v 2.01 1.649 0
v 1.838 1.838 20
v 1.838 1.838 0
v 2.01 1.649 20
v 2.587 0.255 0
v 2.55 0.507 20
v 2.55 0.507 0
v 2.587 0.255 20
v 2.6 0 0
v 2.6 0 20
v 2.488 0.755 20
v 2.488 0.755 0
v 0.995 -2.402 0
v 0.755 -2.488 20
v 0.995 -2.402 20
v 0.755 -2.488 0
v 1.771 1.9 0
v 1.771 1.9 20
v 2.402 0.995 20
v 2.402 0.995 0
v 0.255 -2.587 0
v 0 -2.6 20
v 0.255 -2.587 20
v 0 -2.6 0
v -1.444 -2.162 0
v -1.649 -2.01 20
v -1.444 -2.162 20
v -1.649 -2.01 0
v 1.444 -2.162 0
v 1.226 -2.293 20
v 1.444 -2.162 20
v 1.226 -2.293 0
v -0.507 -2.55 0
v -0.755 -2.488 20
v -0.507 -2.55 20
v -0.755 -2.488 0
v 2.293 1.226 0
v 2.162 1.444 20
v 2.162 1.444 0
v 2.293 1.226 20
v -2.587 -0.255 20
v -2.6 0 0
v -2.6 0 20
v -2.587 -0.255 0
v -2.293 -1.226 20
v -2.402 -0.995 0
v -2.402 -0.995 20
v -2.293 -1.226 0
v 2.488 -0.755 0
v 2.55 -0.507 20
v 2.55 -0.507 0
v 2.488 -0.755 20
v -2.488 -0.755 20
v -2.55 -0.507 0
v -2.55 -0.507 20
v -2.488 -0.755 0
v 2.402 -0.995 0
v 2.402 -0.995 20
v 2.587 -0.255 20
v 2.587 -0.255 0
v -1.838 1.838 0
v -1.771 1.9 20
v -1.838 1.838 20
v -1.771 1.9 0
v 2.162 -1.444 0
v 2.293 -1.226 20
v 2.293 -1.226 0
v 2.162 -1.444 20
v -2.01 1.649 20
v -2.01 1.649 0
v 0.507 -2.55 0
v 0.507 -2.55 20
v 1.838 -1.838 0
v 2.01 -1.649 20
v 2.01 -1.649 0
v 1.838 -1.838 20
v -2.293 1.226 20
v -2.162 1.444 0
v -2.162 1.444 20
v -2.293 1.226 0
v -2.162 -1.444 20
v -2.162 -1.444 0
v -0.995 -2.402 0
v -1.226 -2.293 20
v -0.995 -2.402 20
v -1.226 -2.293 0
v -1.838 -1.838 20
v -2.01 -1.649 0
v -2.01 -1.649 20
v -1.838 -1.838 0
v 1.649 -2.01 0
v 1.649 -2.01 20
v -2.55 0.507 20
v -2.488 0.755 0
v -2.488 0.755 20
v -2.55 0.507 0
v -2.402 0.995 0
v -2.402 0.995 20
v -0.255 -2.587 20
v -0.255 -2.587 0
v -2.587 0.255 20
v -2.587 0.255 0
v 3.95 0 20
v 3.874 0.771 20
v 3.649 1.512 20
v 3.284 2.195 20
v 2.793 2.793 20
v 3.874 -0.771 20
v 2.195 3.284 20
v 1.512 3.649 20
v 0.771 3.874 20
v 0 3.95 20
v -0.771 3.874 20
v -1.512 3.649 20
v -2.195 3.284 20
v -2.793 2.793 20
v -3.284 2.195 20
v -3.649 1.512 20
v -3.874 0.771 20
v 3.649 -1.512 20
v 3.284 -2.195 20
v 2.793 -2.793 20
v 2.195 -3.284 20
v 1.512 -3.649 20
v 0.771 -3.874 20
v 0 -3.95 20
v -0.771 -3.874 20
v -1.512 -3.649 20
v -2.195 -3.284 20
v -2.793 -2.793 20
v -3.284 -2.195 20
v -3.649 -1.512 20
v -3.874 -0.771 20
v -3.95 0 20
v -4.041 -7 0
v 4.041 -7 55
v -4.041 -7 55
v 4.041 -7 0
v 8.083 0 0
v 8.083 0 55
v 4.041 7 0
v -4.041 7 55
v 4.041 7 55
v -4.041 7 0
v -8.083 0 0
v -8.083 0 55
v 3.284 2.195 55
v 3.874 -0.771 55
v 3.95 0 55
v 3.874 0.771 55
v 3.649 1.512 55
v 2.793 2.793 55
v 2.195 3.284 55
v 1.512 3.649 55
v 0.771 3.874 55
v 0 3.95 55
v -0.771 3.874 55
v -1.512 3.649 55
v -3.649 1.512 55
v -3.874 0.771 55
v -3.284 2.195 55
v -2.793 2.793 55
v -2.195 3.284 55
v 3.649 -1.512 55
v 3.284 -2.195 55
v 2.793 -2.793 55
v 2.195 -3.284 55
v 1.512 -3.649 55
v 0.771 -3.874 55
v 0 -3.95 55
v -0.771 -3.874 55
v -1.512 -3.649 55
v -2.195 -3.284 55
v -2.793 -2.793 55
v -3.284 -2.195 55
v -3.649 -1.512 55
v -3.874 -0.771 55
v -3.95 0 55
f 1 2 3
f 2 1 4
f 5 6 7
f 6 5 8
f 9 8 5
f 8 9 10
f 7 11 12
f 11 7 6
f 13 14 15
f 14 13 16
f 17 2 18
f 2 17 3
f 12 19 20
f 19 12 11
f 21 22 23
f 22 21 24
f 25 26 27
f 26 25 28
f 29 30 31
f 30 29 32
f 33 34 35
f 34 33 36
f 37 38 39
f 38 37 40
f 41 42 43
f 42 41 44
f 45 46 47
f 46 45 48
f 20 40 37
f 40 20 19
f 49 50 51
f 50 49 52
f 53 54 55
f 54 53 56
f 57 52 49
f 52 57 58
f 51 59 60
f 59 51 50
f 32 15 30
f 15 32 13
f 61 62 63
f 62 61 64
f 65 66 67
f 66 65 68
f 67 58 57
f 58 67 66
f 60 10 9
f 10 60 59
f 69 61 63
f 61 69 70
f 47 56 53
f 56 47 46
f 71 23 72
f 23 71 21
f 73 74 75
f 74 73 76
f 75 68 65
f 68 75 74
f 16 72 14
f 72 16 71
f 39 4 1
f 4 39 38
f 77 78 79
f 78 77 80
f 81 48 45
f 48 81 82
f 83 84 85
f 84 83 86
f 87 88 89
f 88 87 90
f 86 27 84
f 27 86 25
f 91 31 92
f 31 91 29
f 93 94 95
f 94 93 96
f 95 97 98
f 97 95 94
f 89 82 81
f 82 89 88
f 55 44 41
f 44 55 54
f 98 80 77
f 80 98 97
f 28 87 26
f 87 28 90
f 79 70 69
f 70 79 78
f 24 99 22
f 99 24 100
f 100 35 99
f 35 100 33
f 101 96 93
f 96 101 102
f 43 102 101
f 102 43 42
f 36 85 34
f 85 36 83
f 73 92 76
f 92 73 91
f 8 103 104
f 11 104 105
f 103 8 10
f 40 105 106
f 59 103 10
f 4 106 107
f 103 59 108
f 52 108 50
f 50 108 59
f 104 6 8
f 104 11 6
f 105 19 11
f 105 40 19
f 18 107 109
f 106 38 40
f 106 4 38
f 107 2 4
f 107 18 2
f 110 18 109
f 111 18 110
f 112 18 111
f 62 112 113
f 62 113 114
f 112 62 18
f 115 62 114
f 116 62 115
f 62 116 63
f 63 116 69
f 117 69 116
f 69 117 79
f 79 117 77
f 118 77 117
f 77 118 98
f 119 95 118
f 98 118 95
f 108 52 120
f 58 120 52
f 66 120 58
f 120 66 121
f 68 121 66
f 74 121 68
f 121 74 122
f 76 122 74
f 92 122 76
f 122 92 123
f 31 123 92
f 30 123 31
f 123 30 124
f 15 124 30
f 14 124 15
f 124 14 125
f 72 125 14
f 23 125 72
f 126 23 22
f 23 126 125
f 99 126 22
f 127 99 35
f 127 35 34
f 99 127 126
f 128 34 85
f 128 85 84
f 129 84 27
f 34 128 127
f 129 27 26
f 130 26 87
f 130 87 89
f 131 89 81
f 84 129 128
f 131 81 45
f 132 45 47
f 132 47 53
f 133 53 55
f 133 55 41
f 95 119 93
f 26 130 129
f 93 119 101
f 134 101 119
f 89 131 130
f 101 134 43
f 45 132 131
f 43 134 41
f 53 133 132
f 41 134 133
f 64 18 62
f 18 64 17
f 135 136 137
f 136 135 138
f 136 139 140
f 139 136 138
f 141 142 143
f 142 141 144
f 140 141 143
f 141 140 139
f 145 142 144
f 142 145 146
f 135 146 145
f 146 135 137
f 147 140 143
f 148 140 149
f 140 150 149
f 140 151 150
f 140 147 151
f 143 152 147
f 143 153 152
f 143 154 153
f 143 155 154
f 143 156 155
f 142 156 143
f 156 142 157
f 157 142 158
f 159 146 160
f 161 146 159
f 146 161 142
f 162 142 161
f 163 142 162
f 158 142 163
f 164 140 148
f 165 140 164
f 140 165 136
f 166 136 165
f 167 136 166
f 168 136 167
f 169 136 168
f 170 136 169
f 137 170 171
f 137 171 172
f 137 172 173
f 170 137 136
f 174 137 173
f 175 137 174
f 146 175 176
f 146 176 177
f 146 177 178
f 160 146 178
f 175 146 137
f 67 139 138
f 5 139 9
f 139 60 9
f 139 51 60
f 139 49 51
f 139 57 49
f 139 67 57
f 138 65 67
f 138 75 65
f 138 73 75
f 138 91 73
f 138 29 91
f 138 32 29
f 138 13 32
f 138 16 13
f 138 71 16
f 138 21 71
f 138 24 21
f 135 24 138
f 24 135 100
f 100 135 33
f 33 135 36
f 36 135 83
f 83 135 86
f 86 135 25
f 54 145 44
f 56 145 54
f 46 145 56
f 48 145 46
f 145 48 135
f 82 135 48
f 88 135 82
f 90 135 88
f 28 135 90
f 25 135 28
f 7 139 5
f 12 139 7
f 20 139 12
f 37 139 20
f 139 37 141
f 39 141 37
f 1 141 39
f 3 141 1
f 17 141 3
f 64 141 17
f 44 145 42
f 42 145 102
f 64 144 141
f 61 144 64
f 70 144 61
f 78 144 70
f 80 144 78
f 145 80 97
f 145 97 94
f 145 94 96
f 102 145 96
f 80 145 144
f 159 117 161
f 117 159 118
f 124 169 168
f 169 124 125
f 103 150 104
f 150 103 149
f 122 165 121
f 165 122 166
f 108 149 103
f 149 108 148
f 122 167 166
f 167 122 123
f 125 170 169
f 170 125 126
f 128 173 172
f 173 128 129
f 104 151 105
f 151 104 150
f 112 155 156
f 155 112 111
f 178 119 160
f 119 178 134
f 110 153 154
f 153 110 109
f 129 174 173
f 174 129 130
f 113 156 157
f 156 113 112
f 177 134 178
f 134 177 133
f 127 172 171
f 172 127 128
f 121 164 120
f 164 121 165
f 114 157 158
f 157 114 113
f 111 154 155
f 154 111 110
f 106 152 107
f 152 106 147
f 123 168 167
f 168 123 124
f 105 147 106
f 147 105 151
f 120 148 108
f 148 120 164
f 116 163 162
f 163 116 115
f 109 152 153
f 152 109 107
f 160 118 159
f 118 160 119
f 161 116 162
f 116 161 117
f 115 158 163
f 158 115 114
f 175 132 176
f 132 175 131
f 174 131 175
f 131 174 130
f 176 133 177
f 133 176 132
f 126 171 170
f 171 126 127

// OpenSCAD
// PROJECT: 5kg Vertical Panel Actuator
// PART: Solid D-Profile Hex Coupler (Scratch Build)
// REQ: 14mm Hex + 7.9mm M8 Hole + 5mm D-Profile Hole

/* [Dimensions] */
total_h = 55;
hex_size = 14;       // 14mm across flats for spanner
m8_hole_dia = 7.9;   // Tight fit for M8 rod self-tapping
m8_depth = 35;       // Depth for threaded rod
motor_shaft_dia = 5.2; // 5mm + 0.2mm tolerance
motor_flat_dist = 4.5; // NEMA 17 standard flat-to-curve
motor_depth = 20;

/* [Calculated] */
hex_outer = hex_size / cos(30);

module hex_coupler_v2() {
    difference() {
        // 1. MAIN BODY (Solid Hexagon)
        cylinder(d = hex_outer, h = total_h, $fn = 6);

        // 2. M8 THREADED ROD HOLE (Top)
        translate([0, 0, total_h - m8_depth])
            cylinder(d = m8_hole_dia, h = m8_depth + 1, $fn = 32);

        // 3. MOTOR SHAFT D-PROFILE (Bottom)
        translate([0, 0, -1])
            intersection() {
                // The circular part of the 5mm shaft
                cylinder(d = motor_shaft_dia, h = motor_depth + 1, $fn = 64);
                
                // The Flat Face (creates the D-shape)
                translate([-motor_shaft_dia/2, -motor_shaft_dia/2, 0]) 
                    cube([motor_shaft_dia, motor_flat_dist, motor_depth + 2]); 
            }
    }
}

// Render
hex_coupler_v2();
